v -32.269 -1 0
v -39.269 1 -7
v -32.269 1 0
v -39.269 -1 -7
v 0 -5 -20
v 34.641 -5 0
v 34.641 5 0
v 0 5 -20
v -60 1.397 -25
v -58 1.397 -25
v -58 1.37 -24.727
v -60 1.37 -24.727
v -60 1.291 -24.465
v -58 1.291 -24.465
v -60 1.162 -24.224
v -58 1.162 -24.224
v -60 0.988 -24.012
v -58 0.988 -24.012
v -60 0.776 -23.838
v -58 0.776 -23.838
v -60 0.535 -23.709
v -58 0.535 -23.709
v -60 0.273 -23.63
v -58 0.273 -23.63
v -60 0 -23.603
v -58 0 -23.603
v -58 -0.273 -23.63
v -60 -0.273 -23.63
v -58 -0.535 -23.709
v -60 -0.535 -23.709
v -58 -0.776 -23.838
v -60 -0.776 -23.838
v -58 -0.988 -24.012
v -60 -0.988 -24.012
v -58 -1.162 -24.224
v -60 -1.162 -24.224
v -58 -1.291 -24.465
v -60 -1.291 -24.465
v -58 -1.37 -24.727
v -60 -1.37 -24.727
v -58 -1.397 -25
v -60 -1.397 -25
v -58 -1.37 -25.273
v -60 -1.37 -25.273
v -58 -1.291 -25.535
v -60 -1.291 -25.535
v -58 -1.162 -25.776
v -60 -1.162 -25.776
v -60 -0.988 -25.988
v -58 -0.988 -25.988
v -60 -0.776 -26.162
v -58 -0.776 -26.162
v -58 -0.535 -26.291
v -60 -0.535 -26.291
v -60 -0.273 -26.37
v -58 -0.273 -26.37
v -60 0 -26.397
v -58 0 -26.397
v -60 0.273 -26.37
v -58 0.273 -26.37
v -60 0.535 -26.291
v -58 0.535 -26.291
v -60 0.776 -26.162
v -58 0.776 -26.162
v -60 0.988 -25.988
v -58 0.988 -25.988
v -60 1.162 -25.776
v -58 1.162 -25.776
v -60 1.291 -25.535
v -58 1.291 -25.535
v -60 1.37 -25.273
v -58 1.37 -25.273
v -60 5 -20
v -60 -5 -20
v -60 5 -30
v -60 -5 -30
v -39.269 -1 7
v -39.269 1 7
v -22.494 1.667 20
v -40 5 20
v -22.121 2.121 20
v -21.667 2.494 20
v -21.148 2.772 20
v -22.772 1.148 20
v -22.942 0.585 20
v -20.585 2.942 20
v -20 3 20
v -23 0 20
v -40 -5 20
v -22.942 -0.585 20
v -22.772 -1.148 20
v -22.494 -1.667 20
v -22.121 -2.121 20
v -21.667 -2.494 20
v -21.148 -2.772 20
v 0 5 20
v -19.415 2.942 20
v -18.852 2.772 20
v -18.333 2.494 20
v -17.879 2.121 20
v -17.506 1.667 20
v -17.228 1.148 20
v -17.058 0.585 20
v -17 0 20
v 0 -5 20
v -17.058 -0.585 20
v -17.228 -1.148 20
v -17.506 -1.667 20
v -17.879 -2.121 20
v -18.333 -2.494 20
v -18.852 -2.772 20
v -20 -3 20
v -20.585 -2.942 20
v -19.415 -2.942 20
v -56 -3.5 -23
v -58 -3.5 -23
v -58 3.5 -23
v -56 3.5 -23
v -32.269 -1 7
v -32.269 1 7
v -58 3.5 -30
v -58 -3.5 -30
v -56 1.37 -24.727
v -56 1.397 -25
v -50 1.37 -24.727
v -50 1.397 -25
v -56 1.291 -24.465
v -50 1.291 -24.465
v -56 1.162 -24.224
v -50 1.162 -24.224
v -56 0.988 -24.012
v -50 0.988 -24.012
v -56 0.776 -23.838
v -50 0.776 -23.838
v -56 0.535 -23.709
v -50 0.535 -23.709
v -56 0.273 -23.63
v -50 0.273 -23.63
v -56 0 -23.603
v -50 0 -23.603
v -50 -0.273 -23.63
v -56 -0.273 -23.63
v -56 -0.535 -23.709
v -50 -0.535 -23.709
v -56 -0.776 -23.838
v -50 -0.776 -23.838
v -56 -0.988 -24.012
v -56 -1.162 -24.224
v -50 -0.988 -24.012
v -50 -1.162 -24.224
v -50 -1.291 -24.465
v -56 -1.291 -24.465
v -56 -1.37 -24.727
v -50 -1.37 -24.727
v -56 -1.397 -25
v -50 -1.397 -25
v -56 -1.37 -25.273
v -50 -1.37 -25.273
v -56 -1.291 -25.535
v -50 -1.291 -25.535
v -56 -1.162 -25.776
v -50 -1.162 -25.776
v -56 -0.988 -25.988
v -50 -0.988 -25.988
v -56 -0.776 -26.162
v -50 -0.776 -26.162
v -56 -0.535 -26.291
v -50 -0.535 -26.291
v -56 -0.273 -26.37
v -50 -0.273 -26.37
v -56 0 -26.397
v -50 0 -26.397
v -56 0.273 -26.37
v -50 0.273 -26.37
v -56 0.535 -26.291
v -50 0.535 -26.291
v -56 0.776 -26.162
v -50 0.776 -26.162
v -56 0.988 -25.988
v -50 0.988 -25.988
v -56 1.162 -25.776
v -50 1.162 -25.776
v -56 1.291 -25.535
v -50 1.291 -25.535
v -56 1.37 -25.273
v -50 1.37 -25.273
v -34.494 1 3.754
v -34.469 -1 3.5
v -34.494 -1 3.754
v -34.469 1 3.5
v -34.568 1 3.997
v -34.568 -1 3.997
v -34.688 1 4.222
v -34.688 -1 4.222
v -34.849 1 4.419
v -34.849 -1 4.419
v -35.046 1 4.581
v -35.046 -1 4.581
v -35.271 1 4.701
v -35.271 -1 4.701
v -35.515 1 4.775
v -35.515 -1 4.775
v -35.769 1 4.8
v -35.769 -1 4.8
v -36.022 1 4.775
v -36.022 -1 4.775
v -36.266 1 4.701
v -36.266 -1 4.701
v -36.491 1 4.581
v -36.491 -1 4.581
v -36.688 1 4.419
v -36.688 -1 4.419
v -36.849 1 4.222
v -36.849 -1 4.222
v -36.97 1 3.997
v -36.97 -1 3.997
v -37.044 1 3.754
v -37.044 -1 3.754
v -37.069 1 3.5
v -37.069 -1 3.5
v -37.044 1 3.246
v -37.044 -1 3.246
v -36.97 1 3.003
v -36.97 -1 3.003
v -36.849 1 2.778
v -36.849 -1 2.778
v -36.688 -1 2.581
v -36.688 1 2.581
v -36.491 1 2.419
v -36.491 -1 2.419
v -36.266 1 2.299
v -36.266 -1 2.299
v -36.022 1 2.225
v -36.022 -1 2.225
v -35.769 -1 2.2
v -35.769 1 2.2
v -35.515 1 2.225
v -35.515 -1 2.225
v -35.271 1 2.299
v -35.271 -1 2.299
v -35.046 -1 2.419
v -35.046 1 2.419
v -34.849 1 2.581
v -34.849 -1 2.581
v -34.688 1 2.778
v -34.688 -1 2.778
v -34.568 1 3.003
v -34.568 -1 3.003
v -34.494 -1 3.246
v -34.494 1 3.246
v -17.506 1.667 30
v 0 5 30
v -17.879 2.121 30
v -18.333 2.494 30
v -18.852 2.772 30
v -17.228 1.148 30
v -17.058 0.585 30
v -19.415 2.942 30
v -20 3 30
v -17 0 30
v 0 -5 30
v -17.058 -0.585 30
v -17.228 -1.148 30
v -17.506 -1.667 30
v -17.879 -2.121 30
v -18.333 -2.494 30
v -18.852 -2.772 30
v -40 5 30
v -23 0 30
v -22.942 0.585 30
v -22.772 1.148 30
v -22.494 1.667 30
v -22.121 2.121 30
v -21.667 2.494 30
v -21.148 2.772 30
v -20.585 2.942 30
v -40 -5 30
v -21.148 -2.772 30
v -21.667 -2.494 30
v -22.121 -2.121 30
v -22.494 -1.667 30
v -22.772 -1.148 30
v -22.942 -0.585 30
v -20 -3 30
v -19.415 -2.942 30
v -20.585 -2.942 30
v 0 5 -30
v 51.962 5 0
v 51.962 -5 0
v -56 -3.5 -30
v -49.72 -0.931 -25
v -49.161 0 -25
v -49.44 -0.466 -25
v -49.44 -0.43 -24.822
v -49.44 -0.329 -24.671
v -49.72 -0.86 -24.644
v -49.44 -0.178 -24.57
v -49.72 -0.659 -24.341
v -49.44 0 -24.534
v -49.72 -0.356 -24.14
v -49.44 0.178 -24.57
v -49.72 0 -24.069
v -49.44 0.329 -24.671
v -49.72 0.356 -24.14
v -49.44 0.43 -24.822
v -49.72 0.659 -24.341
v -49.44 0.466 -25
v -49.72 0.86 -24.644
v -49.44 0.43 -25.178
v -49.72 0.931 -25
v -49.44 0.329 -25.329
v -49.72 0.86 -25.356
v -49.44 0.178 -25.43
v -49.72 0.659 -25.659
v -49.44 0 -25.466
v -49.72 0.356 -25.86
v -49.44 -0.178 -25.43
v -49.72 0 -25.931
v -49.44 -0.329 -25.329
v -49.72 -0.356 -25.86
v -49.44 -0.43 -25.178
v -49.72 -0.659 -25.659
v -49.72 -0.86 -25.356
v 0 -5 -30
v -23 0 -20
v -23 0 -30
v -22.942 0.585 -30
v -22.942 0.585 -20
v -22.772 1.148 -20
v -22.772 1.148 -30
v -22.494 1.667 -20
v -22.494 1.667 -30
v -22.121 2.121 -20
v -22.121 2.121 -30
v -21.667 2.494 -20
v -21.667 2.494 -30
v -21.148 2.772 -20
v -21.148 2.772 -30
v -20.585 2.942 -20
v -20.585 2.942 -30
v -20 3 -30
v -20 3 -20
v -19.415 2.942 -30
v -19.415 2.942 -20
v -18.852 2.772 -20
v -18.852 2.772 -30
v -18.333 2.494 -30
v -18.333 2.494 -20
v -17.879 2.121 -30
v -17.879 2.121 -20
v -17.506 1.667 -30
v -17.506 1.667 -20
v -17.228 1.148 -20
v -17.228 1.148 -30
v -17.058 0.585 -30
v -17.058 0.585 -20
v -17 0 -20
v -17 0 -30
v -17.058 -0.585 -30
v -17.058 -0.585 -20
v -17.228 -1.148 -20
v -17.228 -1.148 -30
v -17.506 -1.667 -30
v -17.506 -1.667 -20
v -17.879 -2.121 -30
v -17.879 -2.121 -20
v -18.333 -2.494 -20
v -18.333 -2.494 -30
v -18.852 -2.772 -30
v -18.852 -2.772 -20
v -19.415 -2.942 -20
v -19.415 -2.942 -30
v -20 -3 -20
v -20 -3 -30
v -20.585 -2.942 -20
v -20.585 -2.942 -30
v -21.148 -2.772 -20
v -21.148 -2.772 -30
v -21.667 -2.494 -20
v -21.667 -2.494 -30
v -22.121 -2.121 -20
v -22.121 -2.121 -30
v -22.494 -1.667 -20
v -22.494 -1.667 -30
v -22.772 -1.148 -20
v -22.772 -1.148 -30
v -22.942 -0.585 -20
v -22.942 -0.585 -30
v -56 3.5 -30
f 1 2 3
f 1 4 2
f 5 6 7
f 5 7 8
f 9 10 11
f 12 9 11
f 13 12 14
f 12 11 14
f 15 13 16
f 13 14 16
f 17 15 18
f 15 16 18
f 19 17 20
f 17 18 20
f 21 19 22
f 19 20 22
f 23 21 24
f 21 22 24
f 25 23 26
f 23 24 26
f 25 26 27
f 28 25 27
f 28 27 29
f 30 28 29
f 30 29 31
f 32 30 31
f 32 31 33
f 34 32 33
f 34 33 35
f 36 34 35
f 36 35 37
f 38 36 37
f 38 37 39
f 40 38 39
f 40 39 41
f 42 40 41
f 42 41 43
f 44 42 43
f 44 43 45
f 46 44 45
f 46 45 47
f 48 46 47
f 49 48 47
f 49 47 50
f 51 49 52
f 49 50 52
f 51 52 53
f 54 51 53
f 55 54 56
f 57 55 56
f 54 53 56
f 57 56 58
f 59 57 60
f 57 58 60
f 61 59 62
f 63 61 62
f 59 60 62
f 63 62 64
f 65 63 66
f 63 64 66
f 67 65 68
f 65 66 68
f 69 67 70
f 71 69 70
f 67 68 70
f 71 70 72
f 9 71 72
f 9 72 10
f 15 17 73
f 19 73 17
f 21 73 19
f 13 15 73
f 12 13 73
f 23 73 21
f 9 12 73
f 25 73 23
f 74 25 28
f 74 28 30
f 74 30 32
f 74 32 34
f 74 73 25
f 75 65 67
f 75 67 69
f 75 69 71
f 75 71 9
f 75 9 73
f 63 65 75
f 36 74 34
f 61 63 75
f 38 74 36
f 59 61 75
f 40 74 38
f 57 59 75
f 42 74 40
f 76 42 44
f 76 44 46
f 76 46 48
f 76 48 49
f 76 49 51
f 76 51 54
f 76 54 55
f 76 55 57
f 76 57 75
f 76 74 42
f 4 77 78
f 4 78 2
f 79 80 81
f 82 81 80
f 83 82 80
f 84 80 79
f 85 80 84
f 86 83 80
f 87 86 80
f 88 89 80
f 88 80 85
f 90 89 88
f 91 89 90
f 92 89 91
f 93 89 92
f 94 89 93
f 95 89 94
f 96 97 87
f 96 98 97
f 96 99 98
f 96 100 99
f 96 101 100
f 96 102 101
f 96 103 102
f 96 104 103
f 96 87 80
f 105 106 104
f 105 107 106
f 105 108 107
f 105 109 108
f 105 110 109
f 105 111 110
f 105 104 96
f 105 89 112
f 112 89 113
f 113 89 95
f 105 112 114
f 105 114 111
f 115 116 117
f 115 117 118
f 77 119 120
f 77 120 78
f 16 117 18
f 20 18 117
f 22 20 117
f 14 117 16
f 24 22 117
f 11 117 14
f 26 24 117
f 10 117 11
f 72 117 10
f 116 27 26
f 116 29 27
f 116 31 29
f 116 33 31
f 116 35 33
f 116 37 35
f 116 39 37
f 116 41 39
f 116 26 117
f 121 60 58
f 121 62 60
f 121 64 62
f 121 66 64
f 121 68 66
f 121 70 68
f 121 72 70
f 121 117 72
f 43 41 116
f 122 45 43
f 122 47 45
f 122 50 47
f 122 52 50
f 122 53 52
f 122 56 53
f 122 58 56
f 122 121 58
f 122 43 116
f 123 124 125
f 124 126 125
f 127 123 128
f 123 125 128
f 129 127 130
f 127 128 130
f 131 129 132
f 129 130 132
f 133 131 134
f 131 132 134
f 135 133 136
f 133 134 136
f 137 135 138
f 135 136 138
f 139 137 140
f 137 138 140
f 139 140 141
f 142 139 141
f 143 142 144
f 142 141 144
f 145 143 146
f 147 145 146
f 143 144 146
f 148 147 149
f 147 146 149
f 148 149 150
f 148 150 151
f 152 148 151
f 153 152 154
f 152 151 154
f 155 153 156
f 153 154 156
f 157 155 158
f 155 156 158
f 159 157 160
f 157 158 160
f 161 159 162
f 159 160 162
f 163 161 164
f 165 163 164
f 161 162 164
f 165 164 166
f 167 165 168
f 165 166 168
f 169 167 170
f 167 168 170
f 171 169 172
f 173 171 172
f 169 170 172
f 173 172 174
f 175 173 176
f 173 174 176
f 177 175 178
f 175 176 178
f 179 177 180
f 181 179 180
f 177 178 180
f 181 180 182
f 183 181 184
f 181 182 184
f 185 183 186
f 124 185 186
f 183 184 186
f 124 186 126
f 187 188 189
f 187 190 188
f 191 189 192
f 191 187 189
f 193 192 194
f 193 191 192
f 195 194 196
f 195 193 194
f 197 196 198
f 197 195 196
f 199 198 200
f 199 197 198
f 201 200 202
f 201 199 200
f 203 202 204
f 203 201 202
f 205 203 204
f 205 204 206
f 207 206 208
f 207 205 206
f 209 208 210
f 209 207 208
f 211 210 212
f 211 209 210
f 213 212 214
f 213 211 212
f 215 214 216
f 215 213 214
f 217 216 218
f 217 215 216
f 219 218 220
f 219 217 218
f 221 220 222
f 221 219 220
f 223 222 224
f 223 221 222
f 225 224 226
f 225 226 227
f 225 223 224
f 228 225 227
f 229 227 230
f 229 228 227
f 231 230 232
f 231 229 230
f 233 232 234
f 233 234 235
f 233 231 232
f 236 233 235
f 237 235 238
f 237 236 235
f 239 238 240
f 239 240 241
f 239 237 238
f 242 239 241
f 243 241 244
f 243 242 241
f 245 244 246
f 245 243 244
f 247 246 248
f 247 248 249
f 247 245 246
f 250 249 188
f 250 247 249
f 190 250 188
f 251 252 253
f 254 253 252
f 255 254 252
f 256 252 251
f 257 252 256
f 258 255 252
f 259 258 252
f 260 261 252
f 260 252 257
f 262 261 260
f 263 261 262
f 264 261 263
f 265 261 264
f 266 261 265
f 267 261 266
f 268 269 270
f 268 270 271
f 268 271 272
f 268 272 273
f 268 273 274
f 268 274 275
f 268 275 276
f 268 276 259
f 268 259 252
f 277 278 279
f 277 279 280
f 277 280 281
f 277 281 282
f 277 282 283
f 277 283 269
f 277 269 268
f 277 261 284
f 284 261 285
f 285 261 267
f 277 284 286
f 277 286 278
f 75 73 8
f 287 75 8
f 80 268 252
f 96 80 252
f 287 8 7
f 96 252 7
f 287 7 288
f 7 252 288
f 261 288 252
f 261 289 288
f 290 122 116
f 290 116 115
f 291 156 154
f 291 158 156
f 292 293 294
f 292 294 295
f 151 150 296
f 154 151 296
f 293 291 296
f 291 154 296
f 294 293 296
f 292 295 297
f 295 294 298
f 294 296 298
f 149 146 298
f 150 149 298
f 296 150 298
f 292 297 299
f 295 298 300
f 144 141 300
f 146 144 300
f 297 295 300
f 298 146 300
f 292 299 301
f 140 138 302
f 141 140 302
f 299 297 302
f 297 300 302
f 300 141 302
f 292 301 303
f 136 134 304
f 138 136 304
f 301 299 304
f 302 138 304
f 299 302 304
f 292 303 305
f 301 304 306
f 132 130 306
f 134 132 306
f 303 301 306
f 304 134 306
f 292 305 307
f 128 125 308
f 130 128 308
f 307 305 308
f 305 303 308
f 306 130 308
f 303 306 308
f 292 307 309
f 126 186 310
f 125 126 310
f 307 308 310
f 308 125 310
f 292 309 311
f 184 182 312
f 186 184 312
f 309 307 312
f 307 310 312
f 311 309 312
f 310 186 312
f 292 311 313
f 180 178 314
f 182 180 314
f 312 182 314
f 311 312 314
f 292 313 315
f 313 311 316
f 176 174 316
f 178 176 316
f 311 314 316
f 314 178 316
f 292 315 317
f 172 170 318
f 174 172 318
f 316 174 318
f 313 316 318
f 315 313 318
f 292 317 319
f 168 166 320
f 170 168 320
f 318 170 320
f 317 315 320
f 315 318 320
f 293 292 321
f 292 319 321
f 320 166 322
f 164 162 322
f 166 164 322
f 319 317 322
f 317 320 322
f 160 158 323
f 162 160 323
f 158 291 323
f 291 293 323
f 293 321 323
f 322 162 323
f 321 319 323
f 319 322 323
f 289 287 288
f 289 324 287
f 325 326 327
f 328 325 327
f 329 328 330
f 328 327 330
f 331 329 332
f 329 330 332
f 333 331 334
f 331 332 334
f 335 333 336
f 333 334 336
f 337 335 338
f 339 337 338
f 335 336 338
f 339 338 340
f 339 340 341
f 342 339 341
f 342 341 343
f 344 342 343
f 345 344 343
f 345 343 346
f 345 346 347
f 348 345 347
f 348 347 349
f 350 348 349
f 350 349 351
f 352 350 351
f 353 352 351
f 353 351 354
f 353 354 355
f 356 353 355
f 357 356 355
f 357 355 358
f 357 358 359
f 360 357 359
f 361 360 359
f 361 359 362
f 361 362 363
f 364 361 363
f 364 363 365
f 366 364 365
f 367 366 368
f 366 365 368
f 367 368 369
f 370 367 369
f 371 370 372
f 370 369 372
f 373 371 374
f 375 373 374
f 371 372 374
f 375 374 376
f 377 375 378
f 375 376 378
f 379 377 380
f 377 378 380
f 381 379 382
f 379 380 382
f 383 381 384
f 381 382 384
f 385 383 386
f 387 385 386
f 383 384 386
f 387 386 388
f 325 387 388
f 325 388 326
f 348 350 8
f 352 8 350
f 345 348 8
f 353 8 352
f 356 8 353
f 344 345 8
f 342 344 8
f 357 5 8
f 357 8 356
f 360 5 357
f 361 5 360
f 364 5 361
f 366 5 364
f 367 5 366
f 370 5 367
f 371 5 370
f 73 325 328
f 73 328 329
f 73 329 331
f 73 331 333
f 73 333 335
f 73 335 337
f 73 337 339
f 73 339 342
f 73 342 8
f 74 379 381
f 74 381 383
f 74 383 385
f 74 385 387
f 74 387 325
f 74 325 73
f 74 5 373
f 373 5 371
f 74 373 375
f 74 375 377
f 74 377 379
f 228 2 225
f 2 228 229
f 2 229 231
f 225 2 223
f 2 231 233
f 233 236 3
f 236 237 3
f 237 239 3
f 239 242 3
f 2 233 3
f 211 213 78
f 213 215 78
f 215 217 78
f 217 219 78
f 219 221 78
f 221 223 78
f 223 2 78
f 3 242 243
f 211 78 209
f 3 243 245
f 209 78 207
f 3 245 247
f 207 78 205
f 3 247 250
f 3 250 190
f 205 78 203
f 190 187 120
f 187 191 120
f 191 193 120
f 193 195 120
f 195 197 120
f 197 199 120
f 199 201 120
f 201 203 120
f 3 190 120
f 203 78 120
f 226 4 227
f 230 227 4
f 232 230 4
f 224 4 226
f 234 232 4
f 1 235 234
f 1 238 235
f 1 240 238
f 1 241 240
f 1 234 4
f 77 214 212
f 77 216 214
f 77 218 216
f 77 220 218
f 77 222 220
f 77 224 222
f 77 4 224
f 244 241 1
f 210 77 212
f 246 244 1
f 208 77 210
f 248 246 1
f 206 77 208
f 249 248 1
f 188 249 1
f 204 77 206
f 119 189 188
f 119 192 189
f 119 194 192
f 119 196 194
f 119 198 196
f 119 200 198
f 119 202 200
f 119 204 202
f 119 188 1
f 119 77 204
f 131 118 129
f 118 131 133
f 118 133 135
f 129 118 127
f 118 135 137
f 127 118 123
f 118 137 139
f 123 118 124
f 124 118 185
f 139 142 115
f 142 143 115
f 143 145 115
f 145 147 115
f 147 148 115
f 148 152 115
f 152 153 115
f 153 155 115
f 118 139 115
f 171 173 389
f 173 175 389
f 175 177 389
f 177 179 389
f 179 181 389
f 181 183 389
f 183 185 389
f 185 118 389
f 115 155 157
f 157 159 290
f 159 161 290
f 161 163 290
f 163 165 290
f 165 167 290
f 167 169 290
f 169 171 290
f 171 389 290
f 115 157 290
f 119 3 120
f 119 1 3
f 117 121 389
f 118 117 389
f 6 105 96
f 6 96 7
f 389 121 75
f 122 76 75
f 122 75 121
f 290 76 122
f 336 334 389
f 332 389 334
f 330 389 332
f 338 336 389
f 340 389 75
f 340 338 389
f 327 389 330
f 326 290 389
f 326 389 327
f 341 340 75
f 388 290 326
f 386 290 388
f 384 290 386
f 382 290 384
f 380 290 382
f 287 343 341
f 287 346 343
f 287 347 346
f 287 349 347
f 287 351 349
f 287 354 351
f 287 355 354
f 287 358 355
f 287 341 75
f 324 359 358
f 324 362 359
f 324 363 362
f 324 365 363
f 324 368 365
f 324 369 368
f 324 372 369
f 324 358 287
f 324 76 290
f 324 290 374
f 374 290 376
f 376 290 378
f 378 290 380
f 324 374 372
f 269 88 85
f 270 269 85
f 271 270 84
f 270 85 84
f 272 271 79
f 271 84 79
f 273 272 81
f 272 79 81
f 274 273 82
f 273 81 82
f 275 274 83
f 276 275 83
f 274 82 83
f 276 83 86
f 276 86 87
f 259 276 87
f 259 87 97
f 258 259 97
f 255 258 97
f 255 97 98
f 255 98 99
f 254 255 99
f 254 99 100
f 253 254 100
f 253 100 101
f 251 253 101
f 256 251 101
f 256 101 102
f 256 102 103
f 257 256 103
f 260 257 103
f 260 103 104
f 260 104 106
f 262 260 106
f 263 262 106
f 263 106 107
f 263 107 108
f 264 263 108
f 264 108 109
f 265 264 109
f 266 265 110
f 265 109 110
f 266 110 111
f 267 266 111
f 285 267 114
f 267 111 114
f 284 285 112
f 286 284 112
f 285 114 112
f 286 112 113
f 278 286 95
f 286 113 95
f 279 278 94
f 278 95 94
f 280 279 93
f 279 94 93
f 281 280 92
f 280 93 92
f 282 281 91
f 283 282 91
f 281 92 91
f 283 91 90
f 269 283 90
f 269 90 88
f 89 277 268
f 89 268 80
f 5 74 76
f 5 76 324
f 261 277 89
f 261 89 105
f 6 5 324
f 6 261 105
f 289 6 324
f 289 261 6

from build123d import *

# Parameters (mm, degrees)
F1_DEPTH = 5
F2_W     = 2
F2_H     = 7
F3_DEPTH = 7
F5_D     = 2.794
F5_DEPTH = 10
F5_TIP   = 0.8394022848
F7_D     = 6
F8_R     = 1.3
F9_DEPTH = 1


with BuildPart() as f1:
    # F0 (on Front) → F1 (new body, symmetric)
    with BuildSketch(Plane.XZ):
        Polygon((0, 30), (-40, 30), (-40, 20), (0, 20), (34.6410161514, 0), (0, -20), (-60, -20), (-60, -30), (0, -30), (51.9615242271, 0), align=None)
    extrude(amount=F1_DEPTH, both=True)

    # F2 (on face) → F3 (cut)
    with BuildSketch(Plane(origin=(0, 0, -30), x_dir=(1, 0, 0), z_dir=(0, 0, -1))):
        with Locations((-57, 0)):
            Rectangle(F2_W, F2_H)
    extrude(amount=-F3_DEPTH, mode=Mode.SUBTRACT)

    # F5
    with Locations(Plane(origin=(-60, 0, 0), x_dir=(0, -1, 0), z_dir=(-1, 0, 0))):
        with Locations((0, -25)):
            Hole(F5_D / 2, depth=F5_DEPTH)
            with Locations((0, 0, -(F5_DEPTH + F5_TIP / 2))):  # 118° drill point
                Cone(0, F5_D / 2, F5_TIP, mode=Mode.SUBTRACT)

    # F7 (through all)
    with Locations(Plane.XY.offset(30)):
        with Locations((-20, 0)):
            Hole(F7_D / 2)


with BuildPart() as f9:
    # F8 (on Front) → F9 (new body, symmetric)
    with BuildSketch(Plane.XZ):
        Polygon((-32.2685841207, 0), (-32.2685841207, 7), (-39.2685841207, 7), (-39.2685841207, 0), (-39.2685841207, -7), align=None)
        with Locations((-35.7685841207, 3.5)):
            Circle(F8_R, mode=Mode.SUBTRACT)
    extrude(amount=F9_DEPTH, both=True)


solid = Compound([f1.part, f9.part])
